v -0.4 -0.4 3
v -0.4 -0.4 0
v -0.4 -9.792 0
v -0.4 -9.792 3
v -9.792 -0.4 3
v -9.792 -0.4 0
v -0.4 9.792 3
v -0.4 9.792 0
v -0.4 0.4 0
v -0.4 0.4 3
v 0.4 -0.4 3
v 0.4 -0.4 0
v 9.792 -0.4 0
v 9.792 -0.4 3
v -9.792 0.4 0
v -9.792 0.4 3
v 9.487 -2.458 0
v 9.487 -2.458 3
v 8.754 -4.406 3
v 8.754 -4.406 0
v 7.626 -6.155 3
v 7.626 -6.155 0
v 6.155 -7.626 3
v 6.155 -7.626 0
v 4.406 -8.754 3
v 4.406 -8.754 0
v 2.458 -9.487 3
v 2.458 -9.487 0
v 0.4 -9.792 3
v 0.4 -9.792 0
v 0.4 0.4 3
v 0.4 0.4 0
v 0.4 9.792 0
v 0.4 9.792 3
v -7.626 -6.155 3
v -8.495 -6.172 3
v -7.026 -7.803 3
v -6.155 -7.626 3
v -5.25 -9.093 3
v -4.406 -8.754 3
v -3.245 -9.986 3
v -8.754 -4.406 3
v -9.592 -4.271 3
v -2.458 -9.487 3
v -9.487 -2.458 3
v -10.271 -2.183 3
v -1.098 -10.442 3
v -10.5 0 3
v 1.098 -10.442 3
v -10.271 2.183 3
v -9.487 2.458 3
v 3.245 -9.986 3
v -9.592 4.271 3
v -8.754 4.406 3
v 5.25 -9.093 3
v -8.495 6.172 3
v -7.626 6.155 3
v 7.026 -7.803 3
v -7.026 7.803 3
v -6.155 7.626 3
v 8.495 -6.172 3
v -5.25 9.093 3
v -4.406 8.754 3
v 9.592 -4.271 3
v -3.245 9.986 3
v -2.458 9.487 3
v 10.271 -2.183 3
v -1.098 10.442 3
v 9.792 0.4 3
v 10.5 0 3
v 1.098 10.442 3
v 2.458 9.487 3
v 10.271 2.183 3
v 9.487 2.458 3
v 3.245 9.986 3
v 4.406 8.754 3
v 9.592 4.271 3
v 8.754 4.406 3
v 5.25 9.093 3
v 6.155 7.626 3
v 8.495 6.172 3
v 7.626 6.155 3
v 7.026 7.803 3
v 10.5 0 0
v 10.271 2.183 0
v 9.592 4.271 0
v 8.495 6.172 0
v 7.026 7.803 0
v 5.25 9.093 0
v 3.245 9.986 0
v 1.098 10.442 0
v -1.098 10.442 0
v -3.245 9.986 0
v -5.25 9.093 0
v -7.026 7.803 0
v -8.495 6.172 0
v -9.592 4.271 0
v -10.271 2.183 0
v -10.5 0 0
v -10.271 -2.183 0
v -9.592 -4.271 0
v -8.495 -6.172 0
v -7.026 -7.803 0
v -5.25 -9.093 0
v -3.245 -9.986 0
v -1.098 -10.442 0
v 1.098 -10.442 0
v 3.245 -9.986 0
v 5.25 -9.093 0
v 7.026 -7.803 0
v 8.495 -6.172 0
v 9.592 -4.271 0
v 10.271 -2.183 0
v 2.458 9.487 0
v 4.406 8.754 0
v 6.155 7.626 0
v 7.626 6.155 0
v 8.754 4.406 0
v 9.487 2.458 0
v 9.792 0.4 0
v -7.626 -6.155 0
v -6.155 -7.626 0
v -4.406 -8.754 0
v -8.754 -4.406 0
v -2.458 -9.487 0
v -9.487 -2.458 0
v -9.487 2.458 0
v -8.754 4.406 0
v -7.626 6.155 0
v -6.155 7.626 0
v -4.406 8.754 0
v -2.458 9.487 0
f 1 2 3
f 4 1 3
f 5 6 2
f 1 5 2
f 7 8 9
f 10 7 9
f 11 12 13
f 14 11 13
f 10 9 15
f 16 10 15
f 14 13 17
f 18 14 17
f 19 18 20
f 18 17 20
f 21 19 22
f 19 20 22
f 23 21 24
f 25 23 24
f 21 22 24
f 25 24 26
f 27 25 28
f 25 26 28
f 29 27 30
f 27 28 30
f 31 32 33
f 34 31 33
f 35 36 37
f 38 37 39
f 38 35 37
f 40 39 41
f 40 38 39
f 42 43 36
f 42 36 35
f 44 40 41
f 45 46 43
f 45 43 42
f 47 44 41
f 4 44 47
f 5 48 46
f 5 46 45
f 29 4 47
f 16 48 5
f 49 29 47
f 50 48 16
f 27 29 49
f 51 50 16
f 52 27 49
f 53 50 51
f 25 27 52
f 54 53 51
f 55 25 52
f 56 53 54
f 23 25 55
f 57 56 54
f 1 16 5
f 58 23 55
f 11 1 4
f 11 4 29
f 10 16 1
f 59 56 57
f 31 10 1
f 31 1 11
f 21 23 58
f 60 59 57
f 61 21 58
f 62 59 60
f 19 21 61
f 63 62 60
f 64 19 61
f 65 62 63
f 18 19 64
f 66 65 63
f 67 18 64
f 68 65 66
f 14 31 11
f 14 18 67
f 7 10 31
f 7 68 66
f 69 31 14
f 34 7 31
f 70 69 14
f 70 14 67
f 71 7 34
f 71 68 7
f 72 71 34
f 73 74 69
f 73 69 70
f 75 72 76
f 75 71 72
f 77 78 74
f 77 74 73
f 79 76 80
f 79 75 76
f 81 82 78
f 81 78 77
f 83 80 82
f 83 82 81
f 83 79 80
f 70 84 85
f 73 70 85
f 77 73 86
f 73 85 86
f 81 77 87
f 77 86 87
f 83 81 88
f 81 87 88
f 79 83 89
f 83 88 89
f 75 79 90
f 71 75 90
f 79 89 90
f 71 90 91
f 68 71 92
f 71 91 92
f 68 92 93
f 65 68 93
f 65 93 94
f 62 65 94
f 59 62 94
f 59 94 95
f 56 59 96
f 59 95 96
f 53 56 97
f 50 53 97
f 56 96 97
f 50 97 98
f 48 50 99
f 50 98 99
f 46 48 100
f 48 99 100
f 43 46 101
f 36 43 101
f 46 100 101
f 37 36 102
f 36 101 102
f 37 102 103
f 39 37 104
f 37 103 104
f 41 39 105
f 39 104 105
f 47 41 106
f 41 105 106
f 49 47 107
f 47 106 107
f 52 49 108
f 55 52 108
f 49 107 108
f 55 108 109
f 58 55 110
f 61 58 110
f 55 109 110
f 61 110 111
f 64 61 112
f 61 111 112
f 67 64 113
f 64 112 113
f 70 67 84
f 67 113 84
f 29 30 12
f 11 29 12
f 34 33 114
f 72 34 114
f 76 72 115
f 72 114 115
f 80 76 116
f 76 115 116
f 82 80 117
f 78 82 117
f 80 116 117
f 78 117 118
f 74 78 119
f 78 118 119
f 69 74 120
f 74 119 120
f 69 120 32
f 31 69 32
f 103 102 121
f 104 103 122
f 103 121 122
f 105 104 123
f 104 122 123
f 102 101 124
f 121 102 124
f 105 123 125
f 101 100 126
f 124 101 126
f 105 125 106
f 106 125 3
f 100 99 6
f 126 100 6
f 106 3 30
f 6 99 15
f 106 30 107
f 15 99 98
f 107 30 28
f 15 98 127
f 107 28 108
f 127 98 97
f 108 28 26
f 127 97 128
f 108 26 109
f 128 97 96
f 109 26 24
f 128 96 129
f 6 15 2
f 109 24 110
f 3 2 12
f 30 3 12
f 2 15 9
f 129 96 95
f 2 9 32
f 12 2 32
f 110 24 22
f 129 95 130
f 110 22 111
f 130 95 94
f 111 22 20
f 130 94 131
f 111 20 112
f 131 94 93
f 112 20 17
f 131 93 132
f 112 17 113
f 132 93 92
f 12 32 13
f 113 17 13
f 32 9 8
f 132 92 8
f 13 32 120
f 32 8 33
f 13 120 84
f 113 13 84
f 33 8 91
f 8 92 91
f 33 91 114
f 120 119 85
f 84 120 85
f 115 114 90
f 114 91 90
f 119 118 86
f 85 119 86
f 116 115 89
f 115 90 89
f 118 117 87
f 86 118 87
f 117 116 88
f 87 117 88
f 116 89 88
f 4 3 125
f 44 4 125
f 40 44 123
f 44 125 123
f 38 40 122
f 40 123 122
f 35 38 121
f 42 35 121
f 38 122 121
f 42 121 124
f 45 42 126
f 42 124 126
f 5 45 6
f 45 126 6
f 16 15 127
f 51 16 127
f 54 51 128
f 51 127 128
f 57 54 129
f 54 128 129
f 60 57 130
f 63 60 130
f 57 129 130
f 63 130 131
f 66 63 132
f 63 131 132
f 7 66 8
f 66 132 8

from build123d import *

# Parameters (mm, degrees)
F0_R     = 10.5
F1_DEPTH = 3


with BuildPart() as f1:
    # F0 (on Top) → F1 (new body)
    with BuildSketch(Plane.XY):
        Circle(F0_R)
        with BuildLine():
            Line((-0.4, -0.4), (-0.4, -9.791833))
            ThreePointArc((-0.4, -9.791833), (-6.929646, -6.929646), (-9.791833, -0.4))
            Line((-9.791833, -0.4), (-0.4, -0.4))
        make_face(mode=Mode.SUBTRACT)
        with BuildLine():
            Line((0.4, -0.4), (9.791833, -0.4))
            ThreePointArc((9.791833, -0.4), (6.929646, -6.929646), (0.4, -9.791833))
            Line((0.4, -9.791833), (0.4, -0.4))
        make_face(mode=Mode.SUBTRACT)
        with BuildLine():
            ThreePointArc((-9.791833, 0.4), (-6.929646, 6.929646), (-0.4, 9.791833))
            Line((-0.4, 9.791833), (-0.4, 0.4))
            Line((-0.4, 0.4), (-9.791833, 0.4))
        make_face(mode=Mode.SUBTRACT)
        with BuildLine():
            Line((0.4, 0.4), (0.4, 9.791833))
            ThreePointArc((0.4, 9.791833), (6.929646, 6.929646), (9.791833, 0.4))
            Line((9.791833, 0.4), (0.4, 0.4))
        make_face(mode=Mode.SUBTRACT)
    extrude(amount=F1_DEPTH)


solid = f1.part
